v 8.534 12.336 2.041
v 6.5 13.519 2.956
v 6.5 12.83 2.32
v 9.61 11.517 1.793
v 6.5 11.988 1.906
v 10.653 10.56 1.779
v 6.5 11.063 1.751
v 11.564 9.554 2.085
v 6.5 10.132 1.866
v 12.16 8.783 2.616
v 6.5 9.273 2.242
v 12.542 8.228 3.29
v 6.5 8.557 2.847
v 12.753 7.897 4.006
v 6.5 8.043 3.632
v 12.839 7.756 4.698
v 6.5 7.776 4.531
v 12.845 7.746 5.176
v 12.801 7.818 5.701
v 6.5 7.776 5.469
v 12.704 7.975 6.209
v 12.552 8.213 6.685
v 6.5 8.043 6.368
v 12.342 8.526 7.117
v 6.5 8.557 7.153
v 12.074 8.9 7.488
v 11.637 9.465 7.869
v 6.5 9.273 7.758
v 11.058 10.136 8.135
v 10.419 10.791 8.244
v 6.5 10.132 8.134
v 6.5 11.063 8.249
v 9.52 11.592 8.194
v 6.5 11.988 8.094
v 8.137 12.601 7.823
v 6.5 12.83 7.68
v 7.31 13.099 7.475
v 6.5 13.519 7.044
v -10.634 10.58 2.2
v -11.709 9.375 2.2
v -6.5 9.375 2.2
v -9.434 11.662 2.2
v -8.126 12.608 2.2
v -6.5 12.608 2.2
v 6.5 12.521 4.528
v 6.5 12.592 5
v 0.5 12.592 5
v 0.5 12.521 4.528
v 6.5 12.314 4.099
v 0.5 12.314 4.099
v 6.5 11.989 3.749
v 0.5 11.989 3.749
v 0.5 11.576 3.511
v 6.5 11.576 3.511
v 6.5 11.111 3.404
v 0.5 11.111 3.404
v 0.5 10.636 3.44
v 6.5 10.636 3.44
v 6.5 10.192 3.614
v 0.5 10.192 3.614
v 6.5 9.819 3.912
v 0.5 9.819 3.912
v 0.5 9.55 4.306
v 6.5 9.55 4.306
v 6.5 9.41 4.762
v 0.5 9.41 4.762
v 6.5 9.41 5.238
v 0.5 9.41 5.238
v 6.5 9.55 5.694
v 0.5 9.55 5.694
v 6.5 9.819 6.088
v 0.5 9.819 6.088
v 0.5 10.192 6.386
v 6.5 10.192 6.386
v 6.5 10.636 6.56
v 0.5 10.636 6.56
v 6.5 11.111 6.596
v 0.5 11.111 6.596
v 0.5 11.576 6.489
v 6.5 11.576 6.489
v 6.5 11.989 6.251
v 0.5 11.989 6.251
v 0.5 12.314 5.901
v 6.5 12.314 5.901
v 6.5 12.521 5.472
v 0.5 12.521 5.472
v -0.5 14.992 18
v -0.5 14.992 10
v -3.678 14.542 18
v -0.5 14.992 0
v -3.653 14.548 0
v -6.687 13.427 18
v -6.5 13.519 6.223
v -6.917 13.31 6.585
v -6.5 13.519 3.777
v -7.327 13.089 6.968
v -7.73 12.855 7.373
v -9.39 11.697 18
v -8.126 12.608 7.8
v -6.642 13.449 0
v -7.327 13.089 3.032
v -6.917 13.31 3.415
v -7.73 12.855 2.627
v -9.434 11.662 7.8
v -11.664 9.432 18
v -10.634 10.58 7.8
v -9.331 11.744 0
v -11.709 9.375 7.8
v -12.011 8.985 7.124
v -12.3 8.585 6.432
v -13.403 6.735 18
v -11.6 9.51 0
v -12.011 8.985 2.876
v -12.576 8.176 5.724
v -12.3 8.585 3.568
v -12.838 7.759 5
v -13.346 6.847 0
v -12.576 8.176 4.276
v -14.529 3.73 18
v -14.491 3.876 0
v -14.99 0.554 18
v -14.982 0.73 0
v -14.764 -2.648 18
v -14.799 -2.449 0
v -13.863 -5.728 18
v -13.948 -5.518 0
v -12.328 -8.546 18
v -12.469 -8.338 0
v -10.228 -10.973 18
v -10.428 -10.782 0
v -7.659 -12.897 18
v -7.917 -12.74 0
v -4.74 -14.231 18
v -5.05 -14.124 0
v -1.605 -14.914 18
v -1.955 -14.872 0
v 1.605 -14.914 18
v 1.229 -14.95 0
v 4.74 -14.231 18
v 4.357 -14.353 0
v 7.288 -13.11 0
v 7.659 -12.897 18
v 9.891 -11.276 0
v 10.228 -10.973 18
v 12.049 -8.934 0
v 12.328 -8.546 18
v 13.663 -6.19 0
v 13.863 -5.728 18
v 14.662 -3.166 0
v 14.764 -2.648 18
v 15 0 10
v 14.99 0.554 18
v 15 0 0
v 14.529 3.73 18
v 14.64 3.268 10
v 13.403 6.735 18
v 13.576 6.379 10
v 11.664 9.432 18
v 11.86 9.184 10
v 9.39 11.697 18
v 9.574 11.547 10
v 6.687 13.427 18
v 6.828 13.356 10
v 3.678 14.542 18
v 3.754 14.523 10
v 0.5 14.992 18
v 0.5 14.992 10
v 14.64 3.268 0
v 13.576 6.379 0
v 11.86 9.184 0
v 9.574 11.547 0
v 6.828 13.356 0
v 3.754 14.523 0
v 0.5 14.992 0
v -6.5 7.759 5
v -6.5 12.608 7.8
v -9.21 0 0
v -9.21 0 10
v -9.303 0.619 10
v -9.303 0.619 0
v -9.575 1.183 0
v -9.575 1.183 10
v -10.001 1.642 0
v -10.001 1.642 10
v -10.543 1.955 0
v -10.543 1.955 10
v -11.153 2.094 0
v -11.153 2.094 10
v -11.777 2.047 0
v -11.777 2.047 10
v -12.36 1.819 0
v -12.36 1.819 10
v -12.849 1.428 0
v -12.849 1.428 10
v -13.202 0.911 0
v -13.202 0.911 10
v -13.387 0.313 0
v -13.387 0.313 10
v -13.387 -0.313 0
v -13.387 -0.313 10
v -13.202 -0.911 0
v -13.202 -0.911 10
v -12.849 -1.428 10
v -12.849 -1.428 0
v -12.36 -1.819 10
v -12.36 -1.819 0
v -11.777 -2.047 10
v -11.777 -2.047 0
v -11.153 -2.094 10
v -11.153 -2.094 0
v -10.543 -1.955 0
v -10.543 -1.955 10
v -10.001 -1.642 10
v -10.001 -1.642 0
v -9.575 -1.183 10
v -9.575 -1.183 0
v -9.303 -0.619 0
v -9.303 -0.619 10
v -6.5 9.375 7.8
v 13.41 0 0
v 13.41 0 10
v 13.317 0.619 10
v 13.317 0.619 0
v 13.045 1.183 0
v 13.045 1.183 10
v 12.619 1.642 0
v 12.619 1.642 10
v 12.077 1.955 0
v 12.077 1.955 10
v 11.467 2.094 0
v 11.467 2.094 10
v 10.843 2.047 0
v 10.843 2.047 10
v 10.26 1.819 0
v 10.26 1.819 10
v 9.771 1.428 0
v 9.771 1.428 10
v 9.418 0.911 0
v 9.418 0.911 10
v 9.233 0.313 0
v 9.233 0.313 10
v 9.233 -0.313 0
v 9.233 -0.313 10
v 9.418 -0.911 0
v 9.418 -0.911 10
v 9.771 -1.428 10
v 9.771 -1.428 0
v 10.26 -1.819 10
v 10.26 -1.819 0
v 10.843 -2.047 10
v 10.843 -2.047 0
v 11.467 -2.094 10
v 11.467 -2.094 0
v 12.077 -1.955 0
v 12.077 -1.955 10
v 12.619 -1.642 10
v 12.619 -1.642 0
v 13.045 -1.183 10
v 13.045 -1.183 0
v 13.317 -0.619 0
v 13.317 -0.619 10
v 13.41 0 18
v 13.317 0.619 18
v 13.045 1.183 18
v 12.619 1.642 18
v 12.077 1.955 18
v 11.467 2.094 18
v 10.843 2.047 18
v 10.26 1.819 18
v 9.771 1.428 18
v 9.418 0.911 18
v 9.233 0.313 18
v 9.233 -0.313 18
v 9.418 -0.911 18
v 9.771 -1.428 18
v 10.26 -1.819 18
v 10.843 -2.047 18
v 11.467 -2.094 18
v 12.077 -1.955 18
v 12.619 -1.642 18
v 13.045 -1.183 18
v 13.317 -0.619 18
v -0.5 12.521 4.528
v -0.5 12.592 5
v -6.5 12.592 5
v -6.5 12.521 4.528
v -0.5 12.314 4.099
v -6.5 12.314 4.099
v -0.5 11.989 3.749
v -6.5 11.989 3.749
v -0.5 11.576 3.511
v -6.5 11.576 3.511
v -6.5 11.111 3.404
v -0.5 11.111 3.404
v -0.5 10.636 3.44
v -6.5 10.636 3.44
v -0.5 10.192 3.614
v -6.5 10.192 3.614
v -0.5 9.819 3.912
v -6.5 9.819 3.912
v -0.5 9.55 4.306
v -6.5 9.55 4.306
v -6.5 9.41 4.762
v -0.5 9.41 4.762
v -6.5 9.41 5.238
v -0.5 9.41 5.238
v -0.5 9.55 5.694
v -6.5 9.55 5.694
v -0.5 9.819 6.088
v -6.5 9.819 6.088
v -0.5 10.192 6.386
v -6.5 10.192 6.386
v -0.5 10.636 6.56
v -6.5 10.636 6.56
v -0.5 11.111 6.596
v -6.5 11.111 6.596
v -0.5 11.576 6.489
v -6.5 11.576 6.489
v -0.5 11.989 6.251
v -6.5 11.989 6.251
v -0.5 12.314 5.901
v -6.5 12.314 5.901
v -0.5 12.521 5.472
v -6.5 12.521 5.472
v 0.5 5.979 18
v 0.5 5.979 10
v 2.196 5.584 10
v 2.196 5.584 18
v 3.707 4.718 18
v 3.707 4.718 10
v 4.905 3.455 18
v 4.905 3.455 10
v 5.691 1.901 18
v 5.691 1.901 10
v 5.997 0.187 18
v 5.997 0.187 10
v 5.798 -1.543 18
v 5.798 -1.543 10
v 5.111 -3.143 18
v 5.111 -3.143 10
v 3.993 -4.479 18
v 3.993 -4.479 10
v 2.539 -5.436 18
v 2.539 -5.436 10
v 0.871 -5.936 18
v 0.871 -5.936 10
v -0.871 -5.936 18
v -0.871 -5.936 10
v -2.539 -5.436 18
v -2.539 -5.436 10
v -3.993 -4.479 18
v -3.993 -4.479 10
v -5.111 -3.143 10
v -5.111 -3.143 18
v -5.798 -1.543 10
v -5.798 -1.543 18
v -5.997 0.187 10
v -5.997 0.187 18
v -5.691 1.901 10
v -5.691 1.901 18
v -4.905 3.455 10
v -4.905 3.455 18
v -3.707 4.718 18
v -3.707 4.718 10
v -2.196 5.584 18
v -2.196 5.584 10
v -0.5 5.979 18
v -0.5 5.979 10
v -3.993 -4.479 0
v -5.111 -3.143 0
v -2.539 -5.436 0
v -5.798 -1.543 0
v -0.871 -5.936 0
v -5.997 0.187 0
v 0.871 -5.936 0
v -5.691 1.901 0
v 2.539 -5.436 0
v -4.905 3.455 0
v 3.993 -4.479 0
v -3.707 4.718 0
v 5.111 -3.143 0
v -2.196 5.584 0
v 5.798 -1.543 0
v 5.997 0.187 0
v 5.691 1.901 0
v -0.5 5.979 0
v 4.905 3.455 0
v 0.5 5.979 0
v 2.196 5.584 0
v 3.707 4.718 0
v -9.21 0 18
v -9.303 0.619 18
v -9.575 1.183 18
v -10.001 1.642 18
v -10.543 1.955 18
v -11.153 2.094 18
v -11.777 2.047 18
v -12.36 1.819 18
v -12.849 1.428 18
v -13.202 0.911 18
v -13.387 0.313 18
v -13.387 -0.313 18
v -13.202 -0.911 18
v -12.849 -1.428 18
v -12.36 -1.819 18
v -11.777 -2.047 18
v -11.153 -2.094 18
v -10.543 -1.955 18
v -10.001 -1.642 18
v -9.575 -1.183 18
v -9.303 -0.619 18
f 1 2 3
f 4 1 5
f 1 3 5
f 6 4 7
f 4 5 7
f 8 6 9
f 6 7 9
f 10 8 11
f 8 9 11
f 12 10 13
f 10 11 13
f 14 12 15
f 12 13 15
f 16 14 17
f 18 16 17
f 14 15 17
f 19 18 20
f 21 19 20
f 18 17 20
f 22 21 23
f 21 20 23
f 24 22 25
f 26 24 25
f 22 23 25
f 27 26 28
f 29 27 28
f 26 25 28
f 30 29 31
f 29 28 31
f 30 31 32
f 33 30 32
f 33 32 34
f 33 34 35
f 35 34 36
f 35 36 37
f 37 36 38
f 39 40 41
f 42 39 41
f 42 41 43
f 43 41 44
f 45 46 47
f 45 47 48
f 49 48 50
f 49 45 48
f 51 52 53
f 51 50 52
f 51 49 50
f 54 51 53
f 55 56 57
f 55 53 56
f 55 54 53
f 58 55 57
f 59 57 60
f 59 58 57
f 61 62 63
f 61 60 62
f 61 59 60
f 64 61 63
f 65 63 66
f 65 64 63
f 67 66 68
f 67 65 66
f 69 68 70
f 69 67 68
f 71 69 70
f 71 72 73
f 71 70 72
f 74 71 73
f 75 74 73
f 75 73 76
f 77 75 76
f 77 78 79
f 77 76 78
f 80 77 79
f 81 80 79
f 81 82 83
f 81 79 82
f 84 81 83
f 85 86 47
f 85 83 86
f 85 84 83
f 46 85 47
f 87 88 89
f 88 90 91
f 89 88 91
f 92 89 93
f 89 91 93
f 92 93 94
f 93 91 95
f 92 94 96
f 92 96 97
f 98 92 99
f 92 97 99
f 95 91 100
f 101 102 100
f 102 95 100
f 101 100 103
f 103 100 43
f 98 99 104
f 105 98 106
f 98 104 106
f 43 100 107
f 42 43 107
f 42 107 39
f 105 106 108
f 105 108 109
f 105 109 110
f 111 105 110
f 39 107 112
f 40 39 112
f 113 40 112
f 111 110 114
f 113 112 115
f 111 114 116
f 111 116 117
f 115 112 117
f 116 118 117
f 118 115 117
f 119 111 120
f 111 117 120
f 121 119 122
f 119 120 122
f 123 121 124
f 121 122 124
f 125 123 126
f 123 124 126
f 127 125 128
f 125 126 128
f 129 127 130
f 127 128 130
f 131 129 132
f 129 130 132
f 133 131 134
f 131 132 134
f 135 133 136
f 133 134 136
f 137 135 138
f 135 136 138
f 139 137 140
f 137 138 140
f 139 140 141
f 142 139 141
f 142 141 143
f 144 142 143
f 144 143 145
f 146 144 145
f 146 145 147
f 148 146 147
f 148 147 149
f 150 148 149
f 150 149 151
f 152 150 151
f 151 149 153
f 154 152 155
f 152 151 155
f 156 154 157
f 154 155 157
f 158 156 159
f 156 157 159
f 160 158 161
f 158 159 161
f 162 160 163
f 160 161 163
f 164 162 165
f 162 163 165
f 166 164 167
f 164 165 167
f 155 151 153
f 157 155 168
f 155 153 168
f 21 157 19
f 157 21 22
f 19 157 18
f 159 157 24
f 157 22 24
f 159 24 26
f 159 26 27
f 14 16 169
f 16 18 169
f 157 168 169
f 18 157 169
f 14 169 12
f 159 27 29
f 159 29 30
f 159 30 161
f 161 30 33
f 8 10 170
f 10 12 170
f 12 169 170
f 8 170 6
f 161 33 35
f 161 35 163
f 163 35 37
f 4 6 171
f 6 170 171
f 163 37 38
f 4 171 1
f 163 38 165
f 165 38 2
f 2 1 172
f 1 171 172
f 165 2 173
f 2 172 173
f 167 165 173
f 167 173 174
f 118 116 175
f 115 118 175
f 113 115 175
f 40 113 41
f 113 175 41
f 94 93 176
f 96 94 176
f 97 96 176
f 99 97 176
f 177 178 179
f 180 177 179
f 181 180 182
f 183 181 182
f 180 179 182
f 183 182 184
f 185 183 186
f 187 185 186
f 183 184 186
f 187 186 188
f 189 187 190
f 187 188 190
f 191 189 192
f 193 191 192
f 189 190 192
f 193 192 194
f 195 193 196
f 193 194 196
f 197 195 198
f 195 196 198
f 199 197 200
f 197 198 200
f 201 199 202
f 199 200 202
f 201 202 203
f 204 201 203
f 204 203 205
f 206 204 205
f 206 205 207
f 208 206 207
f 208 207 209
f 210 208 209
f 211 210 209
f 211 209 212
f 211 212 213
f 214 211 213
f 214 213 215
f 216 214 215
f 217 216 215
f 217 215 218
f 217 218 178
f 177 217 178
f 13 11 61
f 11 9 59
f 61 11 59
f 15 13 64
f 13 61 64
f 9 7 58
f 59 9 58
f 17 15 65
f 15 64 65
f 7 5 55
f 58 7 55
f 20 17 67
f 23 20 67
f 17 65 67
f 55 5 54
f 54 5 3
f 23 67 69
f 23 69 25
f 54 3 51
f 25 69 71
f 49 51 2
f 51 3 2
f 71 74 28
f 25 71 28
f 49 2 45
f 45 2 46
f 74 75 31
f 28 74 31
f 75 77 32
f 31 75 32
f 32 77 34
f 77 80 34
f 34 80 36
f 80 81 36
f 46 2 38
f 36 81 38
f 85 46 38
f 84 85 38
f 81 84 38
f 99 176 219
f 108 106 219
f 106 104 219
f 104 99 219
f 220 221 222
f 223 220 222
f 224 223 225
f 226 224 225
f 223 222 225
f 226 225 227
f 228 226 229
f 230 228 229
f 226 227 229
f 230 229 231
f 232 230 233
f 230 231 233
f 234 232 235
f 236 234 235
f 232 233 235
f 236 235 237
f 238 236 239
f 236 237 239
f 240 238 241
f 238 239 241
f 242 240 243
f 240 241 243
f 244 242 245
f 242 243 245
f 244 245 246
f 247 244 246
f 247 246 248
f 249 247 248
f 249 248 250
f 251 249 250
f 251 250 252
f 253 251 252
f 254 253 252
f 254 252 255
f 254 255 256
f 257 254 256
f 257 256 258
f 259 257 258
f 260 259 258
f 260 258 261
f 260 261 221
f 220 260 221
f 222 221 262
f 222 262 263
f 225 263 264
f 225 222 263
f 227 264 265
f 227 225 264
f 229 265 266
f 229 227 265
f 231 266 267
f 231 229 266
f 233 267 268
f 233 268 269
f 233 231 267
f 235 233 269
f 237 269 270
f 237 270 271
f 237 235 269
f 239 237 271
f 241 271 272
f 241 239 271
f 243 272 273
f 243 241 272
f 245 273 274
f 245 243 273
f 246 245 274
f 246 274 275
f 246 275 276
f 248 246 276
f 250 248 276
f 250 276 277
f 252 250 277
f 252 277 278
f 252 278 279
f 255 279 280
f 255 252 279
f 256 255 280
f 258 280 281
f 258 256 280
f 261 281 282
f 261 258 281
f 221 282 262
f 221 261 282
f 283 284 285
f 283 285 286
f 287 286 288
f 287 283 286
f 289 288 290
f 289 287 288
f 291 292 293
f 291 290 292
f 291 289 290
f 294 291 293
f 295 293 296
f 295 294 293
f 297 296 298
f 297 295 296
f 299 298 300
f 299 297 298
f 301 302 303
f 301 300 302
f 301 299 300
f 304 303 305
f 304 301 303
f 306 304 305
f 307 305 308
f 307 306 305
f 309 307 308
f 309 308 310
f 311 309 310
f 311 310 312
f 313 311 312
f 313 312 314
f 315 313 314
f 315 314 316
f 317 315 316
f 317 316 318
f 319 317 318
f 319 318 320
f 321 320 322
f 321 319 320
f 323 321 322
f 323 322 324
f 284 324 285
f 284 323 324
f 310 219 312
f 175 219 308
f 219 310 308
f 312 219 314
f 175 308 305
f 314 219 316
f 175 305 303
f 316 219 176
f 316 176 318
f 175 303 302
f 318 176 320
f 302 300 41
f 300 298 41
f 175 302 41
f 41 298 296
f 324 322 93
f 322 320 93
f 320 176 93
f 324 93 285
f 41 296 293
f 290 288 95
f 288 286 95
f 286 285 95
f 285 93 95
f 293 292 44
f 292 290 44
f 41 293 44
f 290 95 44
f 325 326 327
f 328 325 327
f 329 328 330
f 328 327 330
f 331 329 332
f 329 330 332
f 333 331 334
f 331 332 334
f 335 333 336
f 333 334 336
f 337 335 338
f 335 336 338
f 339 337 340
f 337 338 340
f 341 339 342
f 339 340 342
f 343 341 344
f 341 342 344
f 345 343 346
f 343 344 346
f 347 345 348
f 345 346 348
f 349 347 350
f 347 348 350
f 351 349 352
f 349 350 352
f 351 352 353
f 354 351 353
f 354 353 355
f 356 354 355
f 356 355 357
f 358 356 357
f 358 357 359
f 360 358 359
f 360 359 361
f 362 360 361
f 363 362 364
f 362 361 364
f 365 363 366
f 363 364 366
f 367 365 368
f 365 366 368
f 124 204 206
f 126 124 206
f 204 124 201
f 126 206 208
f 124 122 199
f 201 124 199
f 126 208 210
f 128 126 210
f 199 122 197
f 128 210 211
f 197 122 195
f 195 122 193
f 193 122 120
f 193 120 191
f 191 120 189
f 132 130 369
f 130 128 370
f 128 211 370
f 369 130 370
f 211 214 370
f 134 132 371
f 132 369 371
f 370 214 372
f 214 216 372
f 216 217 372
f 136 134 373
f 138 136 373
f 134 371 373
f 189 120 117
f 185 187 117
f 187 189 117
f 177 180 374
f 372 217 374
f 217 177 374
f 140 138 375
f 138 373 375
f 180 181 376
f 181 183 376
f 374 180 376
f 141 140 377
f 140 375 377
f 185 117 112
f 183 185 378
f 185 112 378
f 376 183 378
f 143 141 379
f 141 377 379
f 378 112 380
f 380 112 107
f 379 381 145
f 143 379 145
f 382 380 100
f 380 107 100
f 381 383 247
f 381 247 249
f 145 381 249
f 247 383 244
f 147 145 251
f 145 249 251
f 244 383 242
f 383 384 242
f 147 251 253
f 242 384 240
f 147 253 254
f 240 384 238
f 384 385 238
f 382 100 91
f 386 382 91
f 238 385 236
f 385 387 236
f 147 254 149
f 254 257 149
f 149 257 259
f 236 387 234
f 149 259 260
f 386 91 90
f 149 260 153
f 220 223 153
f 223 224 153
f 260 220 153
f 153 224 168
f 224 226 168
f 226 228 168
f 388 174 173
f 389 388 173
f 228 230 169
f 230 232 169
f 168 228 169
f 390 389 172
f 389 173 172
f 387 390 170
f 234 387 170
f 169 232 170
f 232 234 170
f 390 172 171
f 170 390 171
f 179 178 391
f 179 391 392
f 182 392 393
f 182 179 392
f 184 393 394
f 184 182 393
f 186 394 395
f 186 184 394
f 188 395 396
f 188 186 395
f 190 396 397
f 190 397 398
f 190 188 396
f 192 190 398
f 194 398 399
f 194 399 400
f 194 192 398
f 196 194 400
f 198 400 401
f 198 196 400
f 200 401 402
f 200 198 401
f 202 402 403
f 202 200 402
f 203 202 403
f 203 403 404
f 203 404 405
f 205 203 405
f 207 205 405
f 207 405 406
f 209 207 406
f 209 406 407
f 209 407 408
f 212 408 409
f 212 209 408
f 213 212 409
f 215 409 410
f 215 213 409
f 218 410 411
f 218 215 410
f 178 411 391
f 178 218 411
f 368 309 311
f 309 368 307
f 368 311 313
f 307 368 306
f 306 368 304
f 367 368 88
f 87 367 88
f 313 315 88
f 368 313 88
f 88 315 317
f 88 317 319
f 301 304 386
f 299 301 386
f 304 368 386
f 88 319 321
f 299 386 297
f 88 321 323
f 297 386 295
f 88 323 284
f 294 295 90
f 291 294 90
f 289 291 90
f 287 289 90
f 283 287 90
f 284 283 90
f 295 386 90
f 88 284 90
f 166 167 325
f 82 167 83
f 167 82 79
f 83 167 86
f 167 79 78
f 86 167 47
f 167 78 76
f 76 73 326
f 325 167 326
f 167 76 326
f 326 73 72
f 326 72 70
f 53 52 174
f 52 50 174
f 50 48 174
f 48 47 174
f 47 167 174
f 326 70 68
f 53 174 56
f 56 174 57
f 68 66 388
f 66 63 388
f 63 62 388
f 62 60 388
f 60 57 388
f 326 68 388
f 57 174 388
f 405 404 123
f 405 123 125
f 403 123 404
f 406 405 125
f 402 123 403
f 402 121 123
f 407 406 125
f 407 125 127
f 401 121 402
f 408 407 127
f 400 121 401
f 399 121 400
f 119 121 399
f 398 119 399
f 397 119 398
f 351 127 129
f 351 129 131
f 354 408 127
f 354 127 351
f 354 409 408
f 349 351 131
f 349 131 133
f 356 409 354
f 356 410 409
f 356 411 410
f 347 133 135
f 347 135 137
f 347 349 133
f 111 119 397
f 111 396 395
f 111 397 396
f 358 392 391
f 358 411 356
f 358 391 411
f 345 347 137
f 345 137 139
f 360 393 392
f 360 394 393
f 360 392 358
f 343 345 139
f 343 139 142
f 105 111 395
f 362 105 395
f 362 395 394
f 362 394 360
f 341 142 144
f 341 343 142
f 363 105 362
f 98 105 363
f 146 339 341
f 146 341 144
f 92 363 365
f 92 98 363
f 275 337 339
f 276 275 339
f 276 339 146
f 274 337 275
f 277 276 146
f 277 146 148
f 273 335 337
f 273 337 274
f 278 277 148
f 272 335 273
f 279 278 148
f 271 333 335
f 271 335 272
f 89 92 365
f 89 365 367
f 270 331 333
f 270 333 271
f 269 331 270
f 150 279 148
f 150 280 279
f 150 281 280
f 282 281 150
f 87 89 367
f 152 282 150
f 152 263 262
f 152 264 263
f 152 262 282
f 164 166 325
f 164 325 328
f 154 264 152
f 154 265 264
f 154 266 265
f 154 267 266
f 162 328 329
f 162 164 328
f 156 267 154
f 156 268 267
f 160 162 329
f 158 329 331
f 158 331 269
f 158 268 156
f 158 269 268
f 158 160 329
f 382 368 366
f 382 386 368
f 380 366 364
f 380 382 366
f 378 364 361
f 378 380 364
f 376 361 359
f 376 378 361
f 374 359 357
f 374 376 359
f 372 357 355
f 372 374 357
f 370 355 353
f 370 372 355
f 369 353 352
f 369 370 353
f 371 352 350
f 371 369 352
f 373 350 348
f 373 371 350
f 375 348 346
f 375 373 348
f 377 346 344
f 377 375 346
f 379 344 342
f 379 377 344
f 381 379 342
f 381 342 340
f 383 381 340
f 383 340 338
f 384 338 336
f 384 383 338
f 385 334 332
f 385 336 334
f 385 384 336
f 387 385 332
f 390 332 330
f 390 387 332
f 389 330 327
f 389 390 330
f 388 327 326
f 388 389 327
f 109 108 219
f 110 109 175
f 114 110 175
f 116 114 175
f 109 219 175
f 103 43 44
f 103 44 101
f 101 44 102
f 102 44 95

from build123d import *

# Parameters (mm, degrees)
SKETCH1_R               = 15
SKETCH1_R_2             = 6
BOSS_EXTRUDE1_DEPTH     = 10
CUT_EXTRUDE1_REACH      = 25.452
SKETCH2_W               = 1
SKETCH2_H               = 15
CUT_EXTRUDE2_DEPTH      = 30
CUT_EXTRUDE2_DEPTH_BACK = 30
SKETCH3_R               = 1.6
CUT_EXTRUDE3_START      = -6
SKETCH4_R               = 3.25
CUT_EXTRUDE3_DEPTH      = 30
CUT_EXTRUDE4_START      = -6
CUT_EXTRUDE4_DEPTH      = 30
CUT_EXTRUDE6_REACH      = 25.452
SKETCH10_R              = 2.1
SKETCH11_R              = 2.1
BOSS_EXTRUDE3_DEPTH     = 8


with BuildPart() as part:
    # Sketch1 → Boss-Extrude1 (new body)
    with BuildSketch(Plane.XY):
        Circle(SKETCH1_R)
        Circle(SKETCH1_R_2, mode=Mode.SUBTRACT)
    extrude(amount=BOSS_EXTRUDE1_DEPTH)

    # Sketch2 → Cut-Extrude1 (cut, up to next)
    with BuildSketch(Plane.XY.offset(10), mode=Mode.PRIVATE) as cut_extrude1_sk1:
        with Locations((0, 10.5)):
            Rectangle(SKETCH2_W, SKETCH2_H)
    cut_extrude1_tool1 = extrude(cut_extrude1_sk1.sketch, amount=-CUT_EXTRUDE1_REACH, mode=Mode.PRIVATE) & part.part
    add(cut_extrude1_tool1.solids().sort_by_distance((0, 10.5, 10))[0], mode=Mode.SUBTRACT)

    # Sketch3 → Cut-Extrude2 (cut, two sides: drawn at the far end of the back side and taken through both)
    with BuildSketch(Plane.ZY.offset(-0.5).offset(-CUT_EXTRUDE2_DEPTH_BACK)):
        with Locations((5, 10.991664351)):
            Circle(SKETCH3_R)
    extrude(amount=CUT_EXTRUDE2_DEPTH + CUT_EXTRUDE2_DEPTH_BACK, mode=Mode.SUBTRACT)

    # Sketch4 → Cut-Extrude3 (cut)
    with BuildSketch(Plane.ZY.offset(-0.5).offset(CUT_EXTRUDE3_START)):
        with Locations((5, 10.991664351)):
            Circle(SKETCH4_R)
    extrude(amount=-CUT_EXTRUDE3_DEPTH, mode=Mode.SUBTRACT)

    # Sketch5 → Cut-Extrude4 (cut)
    with BuildSketch(Plane(origin=(-0.5, 0, 0), x_dir=(0, 0, -1), z_dir=(1, 0, 0)).offset(CUT_EXTRUDE4_START)):
        Polygon((-2.2, 9.375083597), (-2.2, 12.608245104), (-5, 14.224825858), (-7.8, 12.608245104), (-7.8, 9.375083597), (-5, 7.758502843), align=None)
    extrude(amount=-CUT_EXTRUDE4_DEPTH, mode=Mode.SUBTRACT)

    # Sketch10 → Cut-Extrude6 (cut, up to next)
    with BuildSketch(Plane.XY.offset(10), mode=Mode.PRIVATE) as cut_extrude6_sk1:
        with Locations((11.31, 0)):
            Circle(SKETCH10_R)
    cut_extrude6_tool1 = extrude(cut_extrude6_sk1.sketch, amount=-CUT_EXTRUDE6_REACH, mode=Mode.PRIVATE) & part.part
    # Sketch10 → Cut-Extrude6 (cut, up to next)
    with BuildSketch(Plane.XY.offset(10), mode=Mode.PRIVATE) as cut_extrude6_sk2:
        with Locations((-11.31, 0)):
            Circle(SKETCH10_R)
    cut_extrude6_tool2 = extrude(cut_extrude6_sk2.sketch, amount=-CUT_EXTRUDE6_REACH, mode=Mode.PRIVATE) & part.part
    add(cut_extrude6_tool1.solids().sort_by_distance((11.31, 0, 10))[0], mode=Mode.SUBTRACT)
    add(cut_extrude6_tool2.solids().sort_by_distance((-11.31, 0, 10))[0], mode=Mode.SUBTRACT)

    # Sketch11 → Boss-Extrude3 (add)
    with BuildSketch(Plane.XY.offset(10)):
        with BuildLine():
            Line((0.5, 14.991664351), (0.5, 5.979130372))
            ThreePointArc((0.5, 5.979130372), (0, -6), (-0.5, 5.979130372))
            Line((-0.5, 5.979130372), (-0.5, 14.991664351))
            ThreePointArc((-0.5, 14.991664351), (0, -15), (0.5, 14.991664351))
        make_face()
        with Locations((11.31, 0)):
            Circle(SKETCH11_R, mode=Mode.SUBTRACT)
        with Locations((-11.31, 0)):
            Circle(SKETCH11_R, mode=Mode.SUBTRACT)
    extrude(amount=BOSS_EXTRUDE3_DEPTH)


solid = part.part
